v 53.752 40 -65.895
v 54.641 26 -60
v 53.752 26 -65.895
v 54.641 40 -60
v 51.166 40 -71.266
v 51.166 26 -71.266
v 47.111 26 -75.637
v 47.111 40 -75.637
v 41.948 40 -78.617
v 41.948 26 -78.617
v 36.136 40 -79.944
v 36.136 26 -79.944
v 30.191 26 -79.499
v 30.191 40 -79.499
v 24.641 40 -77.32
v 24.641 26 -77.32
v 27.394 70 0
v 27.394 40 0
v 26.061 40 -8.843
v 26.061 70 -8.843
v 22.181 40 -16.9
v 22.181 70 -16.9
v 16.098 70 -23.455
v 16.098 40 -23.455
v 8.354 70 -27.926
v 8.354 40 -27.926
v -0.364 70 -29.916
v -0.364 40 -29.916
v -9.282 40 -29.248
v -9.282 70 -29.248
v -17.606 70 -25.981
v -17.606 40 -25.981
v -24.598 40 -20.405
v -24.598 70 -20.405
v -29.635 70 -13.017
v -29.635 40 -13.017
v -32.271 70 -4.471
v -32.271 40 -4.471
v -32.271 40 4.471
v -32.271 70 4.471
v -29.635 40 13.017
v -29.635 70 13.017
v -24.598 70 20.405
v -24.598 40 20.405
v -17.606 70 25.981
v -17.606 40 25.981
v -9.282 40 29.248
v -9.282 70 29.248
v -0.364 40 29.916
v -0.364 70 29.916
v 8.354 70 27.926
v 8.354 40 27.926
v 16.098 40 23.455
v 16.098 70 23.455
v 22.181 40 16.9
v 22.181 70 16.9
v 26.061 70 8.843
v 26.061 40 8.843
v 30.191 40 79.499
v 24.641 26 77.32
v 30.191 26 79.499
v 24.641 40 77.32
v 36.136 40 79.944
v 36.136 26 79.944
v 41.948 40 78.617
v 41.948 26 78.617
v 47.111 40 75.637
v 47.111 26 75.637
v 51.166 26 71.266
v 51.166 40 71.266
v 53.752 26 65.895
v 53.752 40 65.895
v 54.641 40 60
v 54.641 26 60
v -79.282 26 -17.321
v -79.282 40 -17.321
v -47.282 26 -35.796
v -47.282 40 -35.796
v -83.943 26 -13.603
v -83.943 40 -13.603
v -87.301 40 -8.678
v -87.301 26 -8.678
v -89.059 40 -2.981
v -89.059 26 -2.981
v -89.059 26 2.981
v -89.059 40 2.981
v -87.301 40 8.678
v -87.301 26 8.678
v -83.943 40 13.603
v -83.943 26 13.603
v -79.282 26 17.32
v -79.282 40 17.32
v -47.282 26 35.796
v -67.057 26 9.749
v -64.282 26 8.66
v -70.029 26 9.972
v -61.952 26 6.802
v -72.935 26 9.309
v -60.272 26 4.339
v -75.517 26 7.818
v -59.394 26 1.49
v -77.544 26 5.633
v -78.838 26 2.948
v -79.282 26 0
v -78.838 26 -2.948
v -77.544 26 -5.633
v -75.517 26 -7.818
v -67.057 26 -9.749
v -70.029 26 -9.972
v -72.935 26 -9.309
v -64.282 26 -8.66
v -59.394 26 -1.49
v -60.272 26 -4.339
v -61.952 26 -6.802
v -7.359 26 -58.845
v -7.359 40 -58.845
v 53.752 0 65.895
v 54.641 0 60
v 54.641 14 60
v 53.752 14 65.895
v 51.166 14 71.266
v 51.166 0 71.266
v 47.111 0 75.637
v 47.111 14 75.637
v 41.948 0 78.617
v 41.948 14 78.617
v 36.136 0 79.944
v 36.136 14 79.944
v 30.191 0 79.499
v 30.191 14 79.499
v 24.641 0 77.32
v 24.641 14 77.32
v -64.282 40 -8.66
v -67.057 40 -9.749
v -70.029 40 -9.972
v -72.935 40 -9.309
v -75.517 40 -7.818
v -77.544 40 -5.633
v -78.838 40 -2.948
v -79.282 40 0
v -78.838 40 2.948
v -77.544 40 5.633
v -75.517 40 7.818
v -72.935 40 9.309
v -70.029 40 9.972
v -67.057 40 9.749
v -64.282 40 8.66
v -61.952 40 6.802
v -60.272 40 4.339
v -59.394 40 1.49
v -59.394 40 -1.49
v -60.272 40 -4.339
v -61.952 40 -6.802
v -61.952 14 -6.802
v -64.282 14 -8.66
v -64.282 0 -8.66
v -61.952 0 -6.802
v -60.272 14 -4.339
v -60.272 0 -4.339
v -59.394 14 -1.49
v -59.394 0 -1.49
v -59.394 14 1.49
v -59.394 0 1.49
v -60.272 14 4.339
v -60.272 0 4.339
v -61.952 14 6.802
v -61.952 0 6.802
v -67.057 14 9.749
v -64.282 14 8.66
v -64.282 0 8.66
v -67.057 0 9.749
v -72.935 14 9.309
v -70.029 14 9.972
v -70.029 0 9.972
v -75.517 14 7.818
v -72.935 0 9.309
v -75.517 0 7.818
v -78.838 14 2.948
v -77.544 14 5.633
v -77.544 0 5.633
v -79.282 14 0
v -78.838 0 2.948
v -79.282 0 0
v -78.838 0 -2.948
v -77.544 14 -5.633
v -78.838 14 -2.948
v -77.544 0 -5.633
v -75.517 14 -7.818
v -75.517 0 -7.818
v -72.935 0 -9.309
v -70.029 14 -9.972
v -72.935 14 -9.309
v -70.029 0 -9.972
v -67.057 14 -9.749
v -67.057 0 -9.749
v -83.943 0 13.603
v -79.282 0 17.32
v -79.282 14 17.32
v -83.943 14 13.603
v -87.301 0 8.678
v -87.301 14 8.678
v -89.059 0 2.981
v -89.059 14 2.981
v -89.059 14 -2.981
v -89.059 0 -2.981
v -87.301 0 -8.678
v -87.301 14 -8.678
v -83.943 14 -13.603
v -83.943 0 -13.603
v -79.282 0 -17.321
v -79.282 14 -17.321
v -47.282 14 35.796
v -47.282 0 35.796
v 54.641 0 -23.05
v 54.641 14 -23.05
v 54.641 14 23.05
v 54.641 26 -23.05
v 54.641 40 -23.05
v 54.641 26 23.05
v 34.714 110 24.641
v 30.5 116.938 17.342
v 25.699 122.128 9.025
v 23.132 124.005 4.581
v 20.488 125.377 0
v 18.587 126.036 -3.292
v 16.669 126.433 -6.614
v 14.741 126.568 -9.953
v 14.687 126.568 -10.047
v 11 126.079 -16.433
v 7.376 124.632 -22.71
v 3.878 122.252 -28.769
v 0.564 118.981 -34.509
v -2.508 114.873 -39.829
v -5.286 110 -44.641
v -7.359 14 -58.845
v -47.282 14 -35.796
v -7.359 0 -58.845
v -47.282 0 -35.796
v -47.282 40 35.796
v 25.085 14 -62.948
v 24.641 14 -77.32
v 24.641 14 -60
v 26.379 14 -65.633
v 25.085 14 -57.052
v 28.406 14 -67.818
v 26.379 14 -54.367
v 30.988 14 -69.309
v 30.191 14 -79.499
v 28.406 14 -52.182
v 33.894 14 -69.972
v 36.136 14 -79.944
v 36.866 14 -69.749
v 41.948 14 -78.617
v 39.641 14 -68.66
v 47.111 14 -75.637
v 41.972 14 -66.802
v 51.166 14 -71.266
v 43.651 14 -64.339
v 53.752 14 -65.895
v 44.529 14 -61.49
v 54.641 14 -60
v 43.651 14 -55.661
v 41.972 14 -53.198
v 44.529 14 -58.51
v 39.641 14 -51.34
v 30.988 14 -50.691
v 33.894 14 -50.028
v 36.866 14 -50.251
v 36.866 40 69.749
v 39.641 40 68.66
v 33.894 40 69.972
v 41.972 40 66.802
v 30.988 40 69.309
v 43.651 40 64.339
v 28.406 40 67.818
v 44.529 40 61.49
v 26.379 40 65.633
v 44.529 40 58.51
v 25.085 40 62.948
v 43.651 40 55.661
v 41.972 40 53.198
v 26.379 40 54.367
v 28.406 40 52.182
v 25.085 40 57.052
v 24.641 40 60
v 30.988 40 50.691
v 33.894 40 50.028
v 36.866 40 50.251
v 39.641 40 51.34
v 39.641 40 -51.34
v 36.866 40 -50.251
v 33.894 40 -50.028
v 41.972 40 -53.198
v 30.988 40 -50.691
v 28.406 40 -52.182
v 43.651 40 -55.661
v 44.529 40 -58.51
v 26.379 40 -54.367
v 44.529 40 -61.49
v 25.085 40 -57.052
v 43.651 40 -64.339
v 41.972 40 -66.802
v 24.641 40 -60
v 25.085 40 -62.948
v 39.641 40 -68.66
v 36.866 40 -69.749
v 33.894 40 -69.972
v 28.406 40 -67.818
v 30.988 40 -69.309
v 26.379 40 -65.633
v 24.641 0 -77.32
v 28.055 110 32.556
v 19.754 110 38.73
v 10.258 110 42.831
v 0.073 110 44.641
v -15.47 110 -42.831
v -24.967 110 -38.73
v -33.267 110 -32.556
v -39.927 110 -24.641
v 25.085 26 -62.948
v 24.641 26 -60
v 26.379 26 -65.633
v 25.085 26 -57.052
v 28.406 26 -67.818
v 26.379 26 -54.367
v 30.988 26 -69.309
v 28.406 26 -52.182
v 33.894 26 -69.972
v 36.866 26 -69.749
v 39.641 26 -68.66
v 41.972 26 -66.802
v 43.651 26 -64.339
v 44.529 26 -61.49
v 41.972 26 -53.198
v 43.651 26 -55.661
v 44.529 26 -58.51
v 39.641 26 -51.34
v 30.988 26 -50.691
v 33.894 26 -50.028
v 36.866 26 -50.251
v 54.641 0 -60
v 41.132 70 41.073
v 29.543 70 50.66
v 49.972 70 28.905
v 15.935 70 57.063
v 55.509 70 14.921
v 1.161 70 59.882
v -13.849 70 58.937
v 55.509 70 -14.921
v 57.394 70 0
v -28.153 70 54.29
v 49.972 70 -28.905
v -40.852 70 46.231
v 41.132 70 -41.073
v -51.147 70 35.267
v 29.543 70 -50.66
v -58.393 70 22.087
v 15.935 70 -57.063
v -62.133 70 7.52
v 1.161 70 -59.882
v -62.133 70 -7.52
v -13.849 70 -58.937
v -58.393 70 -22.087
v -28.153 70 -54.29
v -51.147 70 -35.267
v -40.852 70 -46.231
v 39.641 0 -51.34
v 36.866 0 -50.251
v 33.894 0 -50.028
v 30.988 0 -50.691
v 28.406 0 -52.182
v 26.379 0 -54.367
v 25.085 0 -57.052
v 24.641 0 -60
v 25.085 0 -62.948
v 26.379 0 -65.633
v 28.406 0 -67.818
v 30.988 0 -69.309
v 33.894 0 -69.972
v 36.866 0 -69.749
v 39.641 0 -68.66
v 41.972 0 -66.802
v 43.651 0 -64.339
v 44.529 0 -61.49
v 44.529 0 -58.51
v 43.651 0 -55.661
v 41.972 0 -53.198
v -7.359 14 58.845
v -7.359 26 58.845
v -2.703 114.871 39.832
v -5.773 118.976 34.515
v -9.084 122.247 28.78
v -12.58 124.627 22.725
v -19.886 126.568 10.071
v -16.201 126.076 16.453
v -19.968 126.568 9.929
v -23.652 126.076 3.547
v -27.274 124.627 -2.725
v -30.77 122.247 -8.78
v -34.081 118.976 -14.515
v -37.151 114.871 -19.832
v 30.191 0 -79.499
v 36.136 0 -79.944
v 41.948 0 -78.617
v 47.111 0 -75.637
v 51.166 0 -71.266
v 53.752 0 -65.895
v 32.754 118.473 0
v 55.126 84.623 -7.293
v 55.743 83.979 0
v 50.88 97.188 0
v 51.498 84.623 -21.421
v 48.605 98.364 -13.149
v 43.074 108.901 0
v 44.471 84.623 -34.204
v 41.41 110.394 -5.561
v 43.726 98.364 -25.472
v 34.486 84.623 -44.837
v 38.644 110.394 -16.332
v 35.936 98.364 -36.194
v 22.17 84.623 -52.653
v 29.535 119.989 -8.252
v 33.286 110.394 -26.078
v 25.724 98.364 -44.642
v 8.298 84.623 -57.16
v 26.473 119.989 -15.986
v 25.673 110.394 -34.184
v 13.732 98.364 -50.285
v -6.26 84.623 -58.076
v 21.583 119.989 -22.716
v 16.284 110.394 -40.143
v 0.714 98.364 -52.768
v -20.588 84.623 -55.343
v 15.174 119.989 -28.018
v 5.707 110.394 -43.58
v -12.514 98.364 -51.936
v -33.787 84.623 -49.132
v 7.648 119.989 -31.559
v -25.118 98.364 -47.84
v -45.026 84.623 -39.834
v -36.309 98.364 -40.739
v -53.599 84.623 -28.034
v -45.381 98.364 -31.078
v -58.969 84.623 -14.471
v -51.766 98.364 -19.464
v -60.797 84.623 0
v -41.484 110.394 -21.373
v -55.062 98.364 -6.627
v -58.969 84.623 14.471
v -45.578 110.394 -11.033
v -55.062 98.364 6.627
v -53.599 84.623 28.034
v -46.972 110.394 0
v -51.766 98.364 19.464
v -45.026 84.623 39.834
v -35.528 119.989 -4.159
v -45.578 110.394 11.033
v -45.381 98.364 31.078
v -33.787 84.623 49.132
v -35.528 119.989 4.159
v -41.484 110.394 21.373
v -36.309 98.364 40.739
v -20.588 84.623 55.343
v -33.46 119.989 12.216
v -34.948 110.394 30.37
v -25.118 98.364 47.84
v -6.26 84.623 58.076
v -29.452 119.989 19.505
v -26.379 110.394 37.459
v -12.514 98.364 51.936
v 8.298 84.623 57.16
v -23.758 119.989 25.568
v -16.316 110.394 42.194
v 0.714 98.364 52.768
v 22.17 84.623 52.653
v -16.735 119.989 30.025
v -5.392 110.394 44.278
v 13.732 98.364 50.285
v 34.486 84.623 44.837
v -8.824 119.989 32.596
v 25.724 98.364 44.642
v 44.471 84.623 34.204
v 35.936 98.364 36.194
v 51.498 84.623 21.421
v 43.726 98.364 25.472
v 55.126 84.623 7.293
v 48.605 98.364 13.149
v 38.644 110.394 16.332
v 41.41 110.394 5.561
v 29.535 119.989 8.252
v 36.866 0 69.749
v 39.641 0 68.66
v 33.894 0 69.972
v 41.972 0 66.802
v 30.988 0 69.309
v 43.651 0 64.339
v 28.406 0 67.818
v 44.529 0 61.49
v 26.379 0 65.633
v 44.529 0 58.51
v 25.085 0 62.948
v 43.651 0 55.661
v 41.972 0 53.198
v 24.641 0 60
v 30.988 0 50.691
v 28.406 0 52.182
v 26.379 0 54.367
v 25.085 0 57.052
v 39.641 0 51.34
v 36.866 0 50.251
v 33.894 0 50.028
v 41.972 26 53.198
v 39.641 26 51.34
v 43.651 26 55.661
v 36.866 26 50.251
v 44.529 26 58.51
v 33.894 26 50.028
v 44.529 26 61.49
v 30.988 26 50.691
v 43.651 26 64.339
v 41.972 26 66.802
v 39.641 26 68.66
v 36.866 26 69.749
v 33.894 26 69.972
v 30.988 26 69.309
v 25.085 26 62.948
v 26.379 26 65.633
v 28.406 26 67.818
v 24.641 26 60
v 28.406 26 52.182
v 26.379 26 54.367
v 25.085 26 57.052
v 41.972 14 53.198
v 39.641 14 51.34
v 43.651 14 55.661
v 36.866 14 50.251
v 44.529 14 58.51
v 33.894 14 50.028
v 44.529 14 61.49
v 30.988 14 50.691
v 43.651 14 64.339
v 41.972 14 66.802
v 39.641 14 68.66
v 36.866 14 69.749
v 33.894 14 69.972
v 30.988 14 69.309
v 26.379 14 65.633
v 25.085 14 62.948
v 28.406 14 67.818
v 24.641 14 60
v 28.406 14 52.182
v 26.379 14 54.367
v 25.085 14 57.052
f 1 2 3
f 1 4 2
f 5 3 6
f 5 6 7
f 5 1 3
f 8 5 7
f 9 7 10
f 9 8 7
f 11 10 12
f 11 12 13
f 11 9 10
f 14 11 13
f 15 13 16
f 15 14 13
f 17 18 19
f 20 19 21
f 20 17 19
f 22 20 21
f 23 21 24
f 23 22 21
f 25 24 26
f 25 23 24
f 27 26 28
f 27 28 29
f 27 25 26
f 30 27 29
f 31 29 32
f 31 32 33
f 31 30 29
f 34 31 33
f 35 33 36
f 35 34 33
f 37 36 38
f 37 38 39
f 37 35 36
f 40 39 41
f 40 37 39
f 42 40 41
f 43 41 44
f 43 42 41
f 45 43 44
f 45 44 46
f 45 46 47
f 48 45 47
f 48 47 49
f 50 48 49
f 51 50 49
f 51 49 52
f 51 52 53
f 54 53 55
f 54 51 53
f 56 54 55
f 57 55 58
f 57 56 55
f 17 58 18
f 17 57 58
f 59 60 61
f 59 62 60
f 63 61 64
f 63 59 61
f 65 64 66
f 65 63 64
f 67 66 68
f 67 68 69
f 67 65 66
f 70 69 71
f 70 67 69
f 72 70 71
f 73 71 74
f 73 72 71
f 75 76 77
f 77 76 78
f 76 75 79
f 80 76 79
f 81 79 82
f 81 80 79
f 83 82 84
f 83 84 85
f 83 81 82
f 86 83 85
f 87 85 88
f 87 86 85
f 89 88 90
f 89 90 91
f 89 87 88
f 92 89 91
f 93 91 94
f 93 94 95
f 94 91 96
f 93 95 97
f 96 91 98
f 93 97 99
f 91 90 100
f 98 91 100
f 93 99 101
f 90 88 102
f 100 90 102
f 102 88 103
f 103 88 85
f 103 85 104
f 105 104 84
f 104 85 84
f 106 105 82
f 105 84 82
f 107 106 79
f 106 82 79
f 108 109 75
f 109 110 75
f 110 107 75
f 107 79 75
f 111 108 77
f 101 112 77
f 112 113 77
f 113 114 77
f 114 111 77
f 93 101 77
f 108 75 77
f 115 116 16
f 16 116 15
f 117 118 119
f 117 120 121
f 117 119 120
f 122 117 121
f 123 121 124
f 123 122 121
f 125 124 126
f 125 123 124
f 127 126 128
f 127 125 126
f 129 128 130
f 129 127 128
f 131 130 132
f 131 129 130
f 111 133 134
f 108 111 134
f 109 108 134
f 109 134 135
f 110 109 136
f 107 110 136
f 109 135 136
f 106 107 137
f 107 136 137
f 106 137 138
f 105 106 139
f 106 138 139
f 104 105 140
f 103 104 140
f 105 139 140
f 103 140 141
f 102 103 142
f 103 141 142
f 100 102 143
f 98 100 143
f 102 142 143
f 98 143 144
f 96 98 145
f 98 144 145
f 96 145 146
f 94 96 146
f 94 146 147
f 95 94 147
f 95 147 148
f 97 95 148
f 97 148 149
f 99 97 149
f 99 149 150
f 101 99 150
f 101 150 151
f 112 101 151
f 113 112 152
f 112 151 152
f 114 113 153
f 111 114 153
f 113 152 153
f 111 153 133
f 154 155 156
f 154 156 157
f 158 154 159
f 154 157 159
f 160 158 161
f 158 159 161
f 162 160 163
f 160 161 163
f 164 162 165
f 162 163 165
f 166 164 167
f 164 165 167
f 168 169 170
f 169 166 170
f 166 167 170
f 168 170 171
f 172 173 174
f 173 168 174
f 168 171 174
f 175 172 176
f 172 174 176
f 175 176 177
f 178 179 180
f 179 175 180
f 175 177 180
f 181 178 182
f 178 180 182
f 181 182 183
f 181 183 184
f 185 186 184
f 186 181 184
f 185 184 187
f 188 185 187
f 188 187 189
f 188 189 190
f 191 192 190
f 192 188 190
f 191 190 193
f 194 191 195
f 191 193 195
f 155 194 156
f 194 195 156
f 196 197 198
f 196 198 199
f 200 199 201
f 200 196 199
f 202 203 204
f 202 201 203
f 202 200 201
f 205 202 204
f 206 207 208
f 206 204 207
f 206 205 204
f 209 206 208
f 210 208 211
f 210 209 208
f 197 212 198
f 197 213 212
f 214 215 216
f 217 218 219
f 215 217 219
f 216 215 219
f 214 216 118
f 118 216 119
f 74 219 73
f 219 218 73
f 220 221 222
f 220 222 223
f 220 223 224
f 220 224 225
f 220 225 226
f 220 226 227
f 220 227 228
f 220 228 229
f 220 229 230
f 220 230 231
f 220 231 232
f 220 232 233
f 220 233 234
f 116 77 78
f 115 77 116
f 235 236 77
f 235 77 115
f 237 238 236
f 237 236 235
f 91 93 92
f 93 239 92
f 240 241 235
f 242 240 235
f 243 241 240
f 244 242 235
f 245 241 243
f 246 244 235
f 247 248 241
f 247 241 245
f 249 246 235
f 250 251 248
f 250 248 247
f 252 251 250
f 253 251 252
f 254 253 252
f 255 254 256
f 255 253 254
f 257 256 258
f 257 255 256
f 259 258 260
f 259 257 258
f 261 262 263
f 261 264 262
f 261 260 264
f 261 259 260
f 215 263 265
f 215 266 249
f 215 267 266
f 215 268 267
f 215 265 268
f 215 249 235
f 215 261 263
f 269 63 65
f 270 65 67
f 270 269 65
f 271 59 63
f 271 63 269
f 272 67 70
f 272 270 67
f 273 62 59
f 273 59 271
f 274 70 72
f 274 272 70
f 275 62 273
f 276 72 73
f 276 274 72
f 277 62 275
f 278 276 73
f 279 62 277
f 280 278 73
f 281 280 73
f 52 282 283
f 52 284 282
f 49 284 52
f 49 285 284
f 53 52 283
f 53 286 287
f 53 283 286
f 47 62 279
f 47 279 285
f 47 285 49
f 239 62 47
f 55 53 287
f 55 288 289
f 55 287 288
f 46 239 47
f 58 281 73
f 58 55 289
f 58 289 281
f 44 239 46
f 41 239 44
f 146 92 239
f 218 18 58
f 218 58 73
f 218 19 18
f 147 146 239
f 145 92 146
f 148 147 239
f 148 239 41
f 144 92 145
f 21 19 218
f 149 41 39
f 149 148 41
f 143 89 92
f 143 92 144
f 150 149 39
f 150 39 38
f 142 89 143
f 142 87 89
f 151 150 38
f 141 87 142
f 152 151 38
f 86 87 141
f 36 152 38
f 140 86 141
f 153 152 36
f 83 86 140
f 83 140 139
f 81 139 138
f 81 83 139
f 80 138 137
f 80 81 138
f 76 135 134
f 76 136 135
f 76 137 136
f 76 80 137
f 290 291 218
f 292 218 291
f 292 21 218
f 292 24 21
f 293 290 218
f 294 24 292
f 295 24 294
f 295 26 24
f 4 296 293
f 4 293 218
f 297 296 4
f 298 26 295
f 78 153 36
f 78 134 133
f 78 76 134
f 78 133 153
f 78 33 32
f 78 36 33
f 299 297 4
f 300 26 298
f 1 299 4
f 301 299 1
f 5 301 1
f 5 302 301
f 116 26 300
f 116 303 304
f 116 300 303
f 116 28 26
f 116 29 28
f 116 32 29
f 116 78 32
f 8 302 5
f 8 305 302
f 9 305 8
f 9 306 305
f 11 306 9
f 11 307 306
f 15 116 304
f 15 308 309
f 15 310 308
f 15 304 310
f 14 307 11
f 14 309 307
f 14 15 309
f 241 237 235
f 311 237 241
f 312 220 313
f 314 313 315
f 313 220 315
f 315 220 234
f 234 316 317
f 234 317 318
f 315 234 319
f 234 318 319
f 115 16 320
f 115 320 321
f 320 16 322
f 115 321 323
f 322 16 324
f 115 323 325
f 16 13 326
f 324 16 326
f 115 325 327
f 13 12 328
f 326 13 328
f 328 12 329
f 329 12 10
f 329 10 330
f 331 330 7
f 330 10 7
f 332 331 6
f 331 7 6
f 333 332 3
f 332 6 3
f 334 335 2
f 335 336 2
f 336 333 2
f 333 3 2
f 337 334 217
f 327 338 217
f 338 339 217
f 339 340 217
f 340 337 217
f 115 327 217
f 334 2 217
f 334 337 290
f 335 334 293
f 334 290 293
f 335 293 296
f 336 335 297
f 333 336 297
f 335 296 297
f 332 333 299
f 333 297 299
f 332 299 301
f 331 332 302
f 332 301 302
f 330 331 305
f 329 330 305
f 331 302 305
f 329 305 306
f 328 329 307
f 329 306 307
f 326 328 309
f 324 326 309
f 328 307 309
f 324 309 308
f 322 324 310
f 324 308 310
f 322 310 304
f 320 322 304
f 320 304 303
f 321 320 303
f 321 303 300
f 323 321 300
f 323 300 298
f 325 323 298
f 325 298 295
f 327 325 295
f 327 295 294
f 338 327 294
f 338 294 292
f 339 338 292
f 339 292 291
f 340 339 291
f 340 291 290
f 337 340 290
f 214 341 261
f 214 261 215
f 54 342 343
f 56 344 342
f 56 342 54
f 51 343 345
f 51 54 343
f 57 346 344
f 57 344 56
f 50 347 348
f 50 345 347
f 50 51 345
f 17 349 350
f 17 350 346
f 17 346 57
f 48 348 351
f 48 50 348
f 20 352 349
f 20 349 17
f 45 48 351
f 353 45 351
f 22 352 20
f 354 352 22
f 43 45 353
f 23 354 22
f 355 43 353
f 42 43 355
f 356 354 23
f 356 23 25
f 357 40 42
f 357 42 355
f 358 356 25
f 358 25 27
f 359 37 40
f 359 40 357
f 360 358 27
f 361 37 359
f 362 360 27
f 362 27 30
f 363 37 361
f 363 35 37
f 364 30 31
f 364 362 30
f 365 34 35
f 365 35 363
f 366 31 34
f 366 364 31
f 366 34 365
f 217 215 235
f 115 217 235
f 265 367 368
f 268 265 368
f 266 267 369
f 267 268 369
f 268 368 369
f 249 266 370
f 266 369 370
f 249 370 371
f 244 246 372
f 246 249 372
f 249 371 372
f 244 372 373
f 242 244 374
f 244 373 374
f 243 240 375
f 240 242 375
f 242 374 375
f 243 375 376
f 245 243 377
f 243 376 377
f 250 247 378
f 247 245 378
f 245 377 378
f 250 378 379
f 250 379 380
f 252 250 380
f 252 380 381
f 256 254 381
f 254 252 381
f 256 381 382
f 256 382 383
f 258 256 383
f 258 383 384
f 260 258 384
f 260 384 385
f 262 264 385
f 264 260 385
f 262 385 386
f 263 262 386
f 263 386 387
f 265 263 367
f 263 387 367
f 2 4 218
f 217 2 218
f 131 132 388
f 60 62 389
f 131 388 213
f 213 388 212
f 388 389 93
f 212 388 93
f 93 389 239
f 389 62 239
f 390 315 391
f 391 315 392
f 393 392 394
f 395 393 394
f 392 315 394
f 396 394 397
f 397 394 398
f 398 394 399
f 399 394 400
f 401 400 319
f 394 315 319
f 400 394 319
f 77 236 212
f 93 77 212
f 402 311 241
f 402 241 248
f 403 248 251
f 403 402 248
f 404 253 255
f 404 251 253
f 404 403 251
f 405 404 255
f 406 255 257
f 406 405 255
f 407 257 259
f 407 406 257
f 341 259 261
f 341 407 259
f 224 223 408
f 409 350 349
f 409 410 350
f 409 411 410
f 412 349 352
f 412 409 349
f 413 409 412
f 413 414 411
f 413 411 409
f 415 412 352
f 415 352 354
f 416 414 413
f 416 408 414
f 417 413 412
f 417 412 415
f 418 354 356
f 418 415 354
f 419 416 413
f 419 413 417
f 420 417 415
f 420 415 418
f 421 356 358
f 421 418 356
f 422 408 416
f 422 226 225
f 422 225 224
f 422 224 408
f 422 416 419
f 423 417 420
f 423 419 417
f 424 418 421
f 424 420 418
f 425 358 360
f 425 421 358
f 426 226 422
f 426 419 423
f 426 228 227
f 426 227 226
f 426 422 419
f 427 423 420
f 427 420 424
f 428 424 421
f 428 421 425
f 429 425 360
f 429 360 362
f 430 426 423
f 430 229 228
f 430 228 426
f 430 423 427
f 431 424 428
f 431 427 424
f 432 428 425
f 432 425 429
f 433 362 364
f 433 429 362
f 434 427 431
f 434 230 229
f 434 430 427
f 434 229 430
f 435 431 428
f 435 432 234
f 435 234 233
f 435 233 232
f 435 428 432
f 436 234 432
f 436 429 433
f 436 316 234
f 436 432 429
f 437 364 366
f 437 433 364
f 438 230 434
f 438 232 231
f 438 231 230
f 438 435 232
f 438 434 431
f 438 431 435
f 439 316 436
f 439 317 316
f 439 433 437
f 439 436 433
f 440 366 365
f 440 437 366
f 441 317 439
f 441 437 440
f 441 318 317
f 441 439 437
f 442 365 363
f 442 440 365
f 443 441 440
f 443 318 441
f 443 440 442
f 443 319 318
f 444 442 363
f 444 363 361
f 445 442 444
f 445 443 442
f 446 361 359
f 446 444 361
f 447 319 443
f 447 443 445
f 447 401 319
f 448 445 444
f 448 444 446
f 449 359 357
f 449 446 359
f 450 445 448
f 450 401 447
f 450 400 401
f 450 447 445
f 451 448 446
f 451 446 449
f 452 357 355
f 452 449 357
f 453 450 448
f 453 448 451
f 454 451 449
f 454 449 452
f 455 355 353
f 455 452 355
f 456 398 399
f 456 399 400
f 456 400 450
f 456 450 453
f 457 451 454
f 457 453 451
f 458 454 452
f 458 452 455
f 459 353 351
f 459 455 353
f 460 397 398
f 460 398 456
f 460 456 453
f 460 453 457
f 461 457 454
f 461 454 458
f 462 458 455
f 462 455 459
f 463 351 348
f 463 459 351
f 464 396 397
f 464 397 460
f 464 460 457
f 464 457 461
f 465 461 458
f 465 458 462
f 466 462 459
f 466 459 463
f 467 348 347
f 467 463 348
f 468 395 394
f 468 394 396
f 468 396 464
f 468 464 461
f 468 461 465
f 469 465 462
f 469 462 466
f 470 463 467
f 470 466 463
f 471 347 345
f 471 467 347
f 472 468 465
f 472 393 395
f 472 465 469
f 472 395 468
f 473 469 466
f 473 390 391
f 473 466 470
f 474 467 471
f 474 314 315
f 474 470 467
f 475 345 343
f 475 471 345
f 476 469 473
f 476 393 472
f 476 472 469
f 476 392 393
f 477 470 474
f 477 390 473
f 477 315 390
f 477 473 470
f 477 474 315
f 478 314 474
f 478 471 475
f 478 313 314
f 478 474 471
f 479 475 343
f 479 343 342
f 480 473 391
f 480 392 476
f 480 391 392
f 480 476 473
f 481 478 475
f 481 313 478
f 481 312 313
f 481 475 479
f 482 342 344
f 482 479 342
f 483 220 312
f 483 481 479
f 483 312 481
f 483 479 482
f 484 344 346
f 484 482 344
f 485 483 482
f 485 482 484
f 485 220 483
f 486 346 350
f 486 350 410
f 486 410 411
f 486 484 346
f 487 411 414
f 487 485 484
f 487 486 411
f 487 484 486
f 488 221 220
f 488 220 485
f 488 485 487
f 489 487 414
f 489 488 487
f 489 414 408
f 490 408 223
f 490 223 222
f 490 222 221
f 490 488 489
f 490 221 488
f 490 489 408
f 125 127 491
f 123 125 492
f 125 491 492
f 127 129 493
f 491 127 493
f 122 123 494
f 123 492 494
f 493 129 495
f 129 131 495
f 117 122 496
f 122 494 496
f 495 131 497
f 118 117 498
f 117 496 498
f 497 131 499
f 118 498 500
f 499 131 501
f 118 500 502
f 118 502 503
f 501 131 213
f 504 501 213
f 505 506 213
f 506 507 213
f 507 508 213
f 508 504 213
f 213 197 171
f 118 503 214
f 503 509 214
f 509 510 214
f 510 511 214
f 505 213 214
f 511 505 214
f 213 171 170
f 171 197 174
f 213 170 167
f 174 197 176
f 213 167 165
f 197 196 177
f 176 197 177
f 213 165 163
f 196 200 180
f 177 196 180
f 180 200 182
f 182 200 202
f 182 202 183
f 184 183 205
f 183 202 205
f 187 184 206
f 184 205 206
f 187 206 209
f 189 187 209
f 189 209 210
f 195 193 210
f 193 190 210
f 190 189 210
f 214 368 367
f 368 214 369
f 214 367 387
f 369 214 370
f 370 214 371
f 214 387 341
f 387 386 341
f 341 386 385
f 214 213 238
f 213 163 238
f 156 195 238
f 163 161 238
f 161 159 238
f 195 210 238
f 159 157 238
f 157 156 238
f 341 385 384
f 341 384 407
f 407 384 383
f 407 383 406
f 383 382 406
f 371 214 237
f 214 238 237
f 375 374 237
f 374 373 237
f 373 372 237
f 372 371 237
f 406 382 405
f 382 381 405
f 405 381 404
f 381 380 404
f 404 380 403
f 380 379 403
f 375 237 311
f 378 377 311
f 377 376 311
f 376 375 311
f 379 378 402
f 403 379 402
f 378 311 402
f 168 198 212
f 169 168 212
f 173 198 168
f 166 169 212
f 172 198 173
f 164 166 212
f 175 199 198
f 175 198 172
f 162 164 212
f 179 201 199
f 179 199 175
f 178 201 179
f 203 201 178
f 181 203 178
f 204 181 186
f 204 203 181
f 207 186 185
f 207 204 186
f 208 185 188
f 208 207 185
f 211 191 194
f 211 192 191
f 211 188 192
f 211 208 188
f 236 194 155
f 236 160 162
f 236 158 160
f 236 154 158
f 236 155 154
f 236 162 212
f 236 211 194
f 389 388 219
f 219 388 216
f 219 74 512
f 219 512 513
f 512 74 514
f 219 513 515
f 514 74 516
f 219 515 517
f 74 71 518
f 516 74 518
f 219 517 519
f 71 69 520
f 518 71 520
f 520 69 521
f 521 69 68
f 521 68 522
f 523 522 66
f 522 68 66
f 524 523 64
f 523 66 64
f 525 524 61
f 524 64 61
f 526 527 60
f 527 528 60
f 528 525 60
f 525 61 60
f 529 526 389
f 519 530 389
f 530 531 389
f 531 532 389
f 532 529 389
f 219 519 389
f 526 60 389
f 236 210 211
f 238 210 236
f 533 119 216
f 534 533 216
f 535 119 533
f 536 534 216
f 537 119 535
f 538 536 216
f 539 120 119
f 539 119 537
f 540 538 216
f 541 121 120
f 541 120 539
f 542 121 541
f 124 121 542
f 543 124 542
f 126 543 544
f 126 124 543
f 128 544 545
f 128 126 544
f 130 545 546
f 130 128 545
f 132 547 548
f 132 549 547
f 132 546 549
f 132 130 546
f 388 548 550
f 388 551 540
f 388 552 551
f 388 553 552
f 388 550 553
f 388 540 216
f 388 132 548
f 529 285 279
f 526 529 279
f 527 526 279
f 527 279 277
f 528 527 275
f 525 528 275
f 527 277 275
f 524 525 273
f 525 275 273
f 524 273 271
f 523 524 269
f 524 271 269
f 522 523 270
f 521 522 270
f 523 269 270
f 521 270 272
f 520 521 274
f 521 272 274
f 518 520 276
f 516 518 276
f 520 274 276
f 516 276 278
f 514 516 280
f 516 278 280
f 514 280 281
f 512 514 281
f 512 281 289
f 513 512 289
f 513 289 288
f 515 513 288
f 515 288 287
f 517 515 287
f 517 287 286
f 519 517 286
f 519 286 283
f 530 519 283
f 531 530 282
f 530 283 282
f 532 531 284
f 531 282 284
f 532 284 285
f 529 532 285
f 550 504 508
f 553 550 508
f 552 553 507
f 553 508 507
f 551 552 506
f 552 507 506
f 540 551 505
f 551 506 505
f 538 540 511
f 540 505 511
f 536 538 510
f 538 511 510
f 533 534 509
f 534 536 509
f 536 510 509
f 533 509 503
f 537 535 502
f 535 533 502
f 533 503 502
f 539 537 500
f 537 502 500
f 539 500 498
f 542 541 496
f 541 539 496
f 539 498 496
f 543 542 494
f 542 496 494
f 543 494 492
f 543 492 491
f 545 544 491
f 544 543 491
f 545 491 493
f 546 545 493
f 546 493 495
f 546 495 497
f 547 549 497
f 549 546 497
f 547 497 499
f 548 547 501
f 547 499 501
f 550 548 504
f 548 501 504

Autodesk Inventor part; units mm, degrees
ref_plane "YZ Plane" through (0, 0, 0) normal (1, 0, 0) x (0, 1, 0)
ref_plane "XZ Plane" through (0, 0, 0) normal (0, 1, 0) x (-1, 0, 0)
sketch "Sketch1" plane through (0, 0, 0) normal (0, 1, 0) x (-1, 0, 0)
  line L0 (79.282, -17.3205) -> (-24.641, -77.3205)
  line L1 (-54.641, -60) -> (-54.641, 60)
  line L2 (-24.641, 77.3205) -> (79.282, 17.3205)
  arc A0 (79.282, -17.3205) -> (79.282, 17.3205) centre (69.282, 0) ccw
  arc A1 (-54.641, -60) -> (-24.641, -77.3205) centre (-34.641, -60) ccw
  arc A2 (-24.641, 77.3205) -> (-54.641, 60) centre (-34.641, 60) ccw
  line L3 (47.282, -35.7957) -> (47.282, 35.7957)
  line L4 (7.359, 58.8453) -> (-54.641, 23.0496)
  line L5 (-54.641, -23.0496) -> (7.359, -58.8453)
  circle A3 centre (69.282, 0) radius 10
  circle A4 centre (-34.641, -60) radius 10
  circle A5 centre (-34.641, 60) radius 10
  point P0 (0, 0)
  point P1 (109.282, 0)
  point P2 (-54.641, -94.641)
  point P3 (-54.641, 94.641)
  point P4 (0, 0)
  dimension "d18" = 20
  dimension "d19" = 120
  dimension "d22" = 22
  dimension "d25" = 360
  dimension "d27" = 20
extrude "Extrusion1" add sketch "Sketch1" along normal blind 40 contours L0 L5 L1 L4 L2 L3
extrude "Extrusion2" add sketch "Sketch1" along normal blind 14 contours L4 L1 A2 L2
extrude "Extrusion3" add sketch "Sketch1" against normal blind 14 from surface at 40 contours L4 L1 A2 L2
pattern_circular "Circular Pattern1" count 3 over 360 about axis through (0, -10, 0) along (0, 1, 0) of "Extrusion3", "Extrusion2"
ref_plane "Work Plane1" through (0, 70, 0) normal (0, 1, 0) x (1, 0, 0)
sketch "Sketch2" plane through (0, 70, 0) normal (0, 1, 0) x (1, 0, 0)
  line L0 (54.641, 60) -> (54.641, -60) projected
  line L1 (-79.282, 17.3205) -> (24.641, 77.3205) projected
  line L2 (24.641, -77.3205) -> (-79.282, -17.3205) projected
  circle A0 centre (-2.6063, 0) radius 57.2473
  circle A1 centre (-2.6063, 0) radius 30
  point P0 (0, 0)
  point P1 (-7.359, 58.8453)
  point P2 (-47.282, 35.7957)
  point P3 (-47.282, -35.7957)
  point P4 (-7.359, -58.8453)
  dimension "d38" = 60
extrude "Extrusion4" add sketch "Sketch2" against normal up to surface (30 mm away) contours A1
sketch "Sketch3" plane through (0, 0, 0) normal (0, 0, 1) x (1, 0, 0)
  line L0 (27.3937, 70) -> (-32.6063, 70) projected
  line L1 (57.3937, 70) -> (-2.6063, 70)
  line L2 (-2.6063, 70) -> (-2.6063, 130)
  arc A0 (57.3937, 70) -> (-2.6063, 130) centre (-2.6063, 70) ccw
  line L3 (-32.6063, 40) -> (27.3937, 40) projected
  point P0 (0, 0)
  point P1 (-2.6063, 70)
  dimension "d41" = 60
revolve "Revolution1" add sketch "Sketch3" angle 360 about axis through (-2.6063, 70, 0) along (0, 1, 0)
sketch "Sketch4" plane through (-79.282, 0, -17.3205) normal (-0.5, 0, -0.8660254) x (-0.8660254, 0, 0.5)
  arc A0 (2.2571, 70) -> (-117.7429, 70) centre (-57.7429, 70) ccw projected
  line L0 (-77.7429, 126.5685) -> (-77.7429, 110)
  line L1 (-77.7429, 110) -> (-37.7429, 110)
  line L2 (-37.7429, 110) -> (-37.7429, 126.5685)
  line L3 (2.2571, 70) -> (-117.7429, 70) projected
  point P0 (-60, 0)
  dimension "d43" = 40
  dimension "d44" = 40
extrude "Extrusion5" cut sketch "Sketch4" against normal up to surface contours L2 L1 L0 A0
properties part number "b4"
